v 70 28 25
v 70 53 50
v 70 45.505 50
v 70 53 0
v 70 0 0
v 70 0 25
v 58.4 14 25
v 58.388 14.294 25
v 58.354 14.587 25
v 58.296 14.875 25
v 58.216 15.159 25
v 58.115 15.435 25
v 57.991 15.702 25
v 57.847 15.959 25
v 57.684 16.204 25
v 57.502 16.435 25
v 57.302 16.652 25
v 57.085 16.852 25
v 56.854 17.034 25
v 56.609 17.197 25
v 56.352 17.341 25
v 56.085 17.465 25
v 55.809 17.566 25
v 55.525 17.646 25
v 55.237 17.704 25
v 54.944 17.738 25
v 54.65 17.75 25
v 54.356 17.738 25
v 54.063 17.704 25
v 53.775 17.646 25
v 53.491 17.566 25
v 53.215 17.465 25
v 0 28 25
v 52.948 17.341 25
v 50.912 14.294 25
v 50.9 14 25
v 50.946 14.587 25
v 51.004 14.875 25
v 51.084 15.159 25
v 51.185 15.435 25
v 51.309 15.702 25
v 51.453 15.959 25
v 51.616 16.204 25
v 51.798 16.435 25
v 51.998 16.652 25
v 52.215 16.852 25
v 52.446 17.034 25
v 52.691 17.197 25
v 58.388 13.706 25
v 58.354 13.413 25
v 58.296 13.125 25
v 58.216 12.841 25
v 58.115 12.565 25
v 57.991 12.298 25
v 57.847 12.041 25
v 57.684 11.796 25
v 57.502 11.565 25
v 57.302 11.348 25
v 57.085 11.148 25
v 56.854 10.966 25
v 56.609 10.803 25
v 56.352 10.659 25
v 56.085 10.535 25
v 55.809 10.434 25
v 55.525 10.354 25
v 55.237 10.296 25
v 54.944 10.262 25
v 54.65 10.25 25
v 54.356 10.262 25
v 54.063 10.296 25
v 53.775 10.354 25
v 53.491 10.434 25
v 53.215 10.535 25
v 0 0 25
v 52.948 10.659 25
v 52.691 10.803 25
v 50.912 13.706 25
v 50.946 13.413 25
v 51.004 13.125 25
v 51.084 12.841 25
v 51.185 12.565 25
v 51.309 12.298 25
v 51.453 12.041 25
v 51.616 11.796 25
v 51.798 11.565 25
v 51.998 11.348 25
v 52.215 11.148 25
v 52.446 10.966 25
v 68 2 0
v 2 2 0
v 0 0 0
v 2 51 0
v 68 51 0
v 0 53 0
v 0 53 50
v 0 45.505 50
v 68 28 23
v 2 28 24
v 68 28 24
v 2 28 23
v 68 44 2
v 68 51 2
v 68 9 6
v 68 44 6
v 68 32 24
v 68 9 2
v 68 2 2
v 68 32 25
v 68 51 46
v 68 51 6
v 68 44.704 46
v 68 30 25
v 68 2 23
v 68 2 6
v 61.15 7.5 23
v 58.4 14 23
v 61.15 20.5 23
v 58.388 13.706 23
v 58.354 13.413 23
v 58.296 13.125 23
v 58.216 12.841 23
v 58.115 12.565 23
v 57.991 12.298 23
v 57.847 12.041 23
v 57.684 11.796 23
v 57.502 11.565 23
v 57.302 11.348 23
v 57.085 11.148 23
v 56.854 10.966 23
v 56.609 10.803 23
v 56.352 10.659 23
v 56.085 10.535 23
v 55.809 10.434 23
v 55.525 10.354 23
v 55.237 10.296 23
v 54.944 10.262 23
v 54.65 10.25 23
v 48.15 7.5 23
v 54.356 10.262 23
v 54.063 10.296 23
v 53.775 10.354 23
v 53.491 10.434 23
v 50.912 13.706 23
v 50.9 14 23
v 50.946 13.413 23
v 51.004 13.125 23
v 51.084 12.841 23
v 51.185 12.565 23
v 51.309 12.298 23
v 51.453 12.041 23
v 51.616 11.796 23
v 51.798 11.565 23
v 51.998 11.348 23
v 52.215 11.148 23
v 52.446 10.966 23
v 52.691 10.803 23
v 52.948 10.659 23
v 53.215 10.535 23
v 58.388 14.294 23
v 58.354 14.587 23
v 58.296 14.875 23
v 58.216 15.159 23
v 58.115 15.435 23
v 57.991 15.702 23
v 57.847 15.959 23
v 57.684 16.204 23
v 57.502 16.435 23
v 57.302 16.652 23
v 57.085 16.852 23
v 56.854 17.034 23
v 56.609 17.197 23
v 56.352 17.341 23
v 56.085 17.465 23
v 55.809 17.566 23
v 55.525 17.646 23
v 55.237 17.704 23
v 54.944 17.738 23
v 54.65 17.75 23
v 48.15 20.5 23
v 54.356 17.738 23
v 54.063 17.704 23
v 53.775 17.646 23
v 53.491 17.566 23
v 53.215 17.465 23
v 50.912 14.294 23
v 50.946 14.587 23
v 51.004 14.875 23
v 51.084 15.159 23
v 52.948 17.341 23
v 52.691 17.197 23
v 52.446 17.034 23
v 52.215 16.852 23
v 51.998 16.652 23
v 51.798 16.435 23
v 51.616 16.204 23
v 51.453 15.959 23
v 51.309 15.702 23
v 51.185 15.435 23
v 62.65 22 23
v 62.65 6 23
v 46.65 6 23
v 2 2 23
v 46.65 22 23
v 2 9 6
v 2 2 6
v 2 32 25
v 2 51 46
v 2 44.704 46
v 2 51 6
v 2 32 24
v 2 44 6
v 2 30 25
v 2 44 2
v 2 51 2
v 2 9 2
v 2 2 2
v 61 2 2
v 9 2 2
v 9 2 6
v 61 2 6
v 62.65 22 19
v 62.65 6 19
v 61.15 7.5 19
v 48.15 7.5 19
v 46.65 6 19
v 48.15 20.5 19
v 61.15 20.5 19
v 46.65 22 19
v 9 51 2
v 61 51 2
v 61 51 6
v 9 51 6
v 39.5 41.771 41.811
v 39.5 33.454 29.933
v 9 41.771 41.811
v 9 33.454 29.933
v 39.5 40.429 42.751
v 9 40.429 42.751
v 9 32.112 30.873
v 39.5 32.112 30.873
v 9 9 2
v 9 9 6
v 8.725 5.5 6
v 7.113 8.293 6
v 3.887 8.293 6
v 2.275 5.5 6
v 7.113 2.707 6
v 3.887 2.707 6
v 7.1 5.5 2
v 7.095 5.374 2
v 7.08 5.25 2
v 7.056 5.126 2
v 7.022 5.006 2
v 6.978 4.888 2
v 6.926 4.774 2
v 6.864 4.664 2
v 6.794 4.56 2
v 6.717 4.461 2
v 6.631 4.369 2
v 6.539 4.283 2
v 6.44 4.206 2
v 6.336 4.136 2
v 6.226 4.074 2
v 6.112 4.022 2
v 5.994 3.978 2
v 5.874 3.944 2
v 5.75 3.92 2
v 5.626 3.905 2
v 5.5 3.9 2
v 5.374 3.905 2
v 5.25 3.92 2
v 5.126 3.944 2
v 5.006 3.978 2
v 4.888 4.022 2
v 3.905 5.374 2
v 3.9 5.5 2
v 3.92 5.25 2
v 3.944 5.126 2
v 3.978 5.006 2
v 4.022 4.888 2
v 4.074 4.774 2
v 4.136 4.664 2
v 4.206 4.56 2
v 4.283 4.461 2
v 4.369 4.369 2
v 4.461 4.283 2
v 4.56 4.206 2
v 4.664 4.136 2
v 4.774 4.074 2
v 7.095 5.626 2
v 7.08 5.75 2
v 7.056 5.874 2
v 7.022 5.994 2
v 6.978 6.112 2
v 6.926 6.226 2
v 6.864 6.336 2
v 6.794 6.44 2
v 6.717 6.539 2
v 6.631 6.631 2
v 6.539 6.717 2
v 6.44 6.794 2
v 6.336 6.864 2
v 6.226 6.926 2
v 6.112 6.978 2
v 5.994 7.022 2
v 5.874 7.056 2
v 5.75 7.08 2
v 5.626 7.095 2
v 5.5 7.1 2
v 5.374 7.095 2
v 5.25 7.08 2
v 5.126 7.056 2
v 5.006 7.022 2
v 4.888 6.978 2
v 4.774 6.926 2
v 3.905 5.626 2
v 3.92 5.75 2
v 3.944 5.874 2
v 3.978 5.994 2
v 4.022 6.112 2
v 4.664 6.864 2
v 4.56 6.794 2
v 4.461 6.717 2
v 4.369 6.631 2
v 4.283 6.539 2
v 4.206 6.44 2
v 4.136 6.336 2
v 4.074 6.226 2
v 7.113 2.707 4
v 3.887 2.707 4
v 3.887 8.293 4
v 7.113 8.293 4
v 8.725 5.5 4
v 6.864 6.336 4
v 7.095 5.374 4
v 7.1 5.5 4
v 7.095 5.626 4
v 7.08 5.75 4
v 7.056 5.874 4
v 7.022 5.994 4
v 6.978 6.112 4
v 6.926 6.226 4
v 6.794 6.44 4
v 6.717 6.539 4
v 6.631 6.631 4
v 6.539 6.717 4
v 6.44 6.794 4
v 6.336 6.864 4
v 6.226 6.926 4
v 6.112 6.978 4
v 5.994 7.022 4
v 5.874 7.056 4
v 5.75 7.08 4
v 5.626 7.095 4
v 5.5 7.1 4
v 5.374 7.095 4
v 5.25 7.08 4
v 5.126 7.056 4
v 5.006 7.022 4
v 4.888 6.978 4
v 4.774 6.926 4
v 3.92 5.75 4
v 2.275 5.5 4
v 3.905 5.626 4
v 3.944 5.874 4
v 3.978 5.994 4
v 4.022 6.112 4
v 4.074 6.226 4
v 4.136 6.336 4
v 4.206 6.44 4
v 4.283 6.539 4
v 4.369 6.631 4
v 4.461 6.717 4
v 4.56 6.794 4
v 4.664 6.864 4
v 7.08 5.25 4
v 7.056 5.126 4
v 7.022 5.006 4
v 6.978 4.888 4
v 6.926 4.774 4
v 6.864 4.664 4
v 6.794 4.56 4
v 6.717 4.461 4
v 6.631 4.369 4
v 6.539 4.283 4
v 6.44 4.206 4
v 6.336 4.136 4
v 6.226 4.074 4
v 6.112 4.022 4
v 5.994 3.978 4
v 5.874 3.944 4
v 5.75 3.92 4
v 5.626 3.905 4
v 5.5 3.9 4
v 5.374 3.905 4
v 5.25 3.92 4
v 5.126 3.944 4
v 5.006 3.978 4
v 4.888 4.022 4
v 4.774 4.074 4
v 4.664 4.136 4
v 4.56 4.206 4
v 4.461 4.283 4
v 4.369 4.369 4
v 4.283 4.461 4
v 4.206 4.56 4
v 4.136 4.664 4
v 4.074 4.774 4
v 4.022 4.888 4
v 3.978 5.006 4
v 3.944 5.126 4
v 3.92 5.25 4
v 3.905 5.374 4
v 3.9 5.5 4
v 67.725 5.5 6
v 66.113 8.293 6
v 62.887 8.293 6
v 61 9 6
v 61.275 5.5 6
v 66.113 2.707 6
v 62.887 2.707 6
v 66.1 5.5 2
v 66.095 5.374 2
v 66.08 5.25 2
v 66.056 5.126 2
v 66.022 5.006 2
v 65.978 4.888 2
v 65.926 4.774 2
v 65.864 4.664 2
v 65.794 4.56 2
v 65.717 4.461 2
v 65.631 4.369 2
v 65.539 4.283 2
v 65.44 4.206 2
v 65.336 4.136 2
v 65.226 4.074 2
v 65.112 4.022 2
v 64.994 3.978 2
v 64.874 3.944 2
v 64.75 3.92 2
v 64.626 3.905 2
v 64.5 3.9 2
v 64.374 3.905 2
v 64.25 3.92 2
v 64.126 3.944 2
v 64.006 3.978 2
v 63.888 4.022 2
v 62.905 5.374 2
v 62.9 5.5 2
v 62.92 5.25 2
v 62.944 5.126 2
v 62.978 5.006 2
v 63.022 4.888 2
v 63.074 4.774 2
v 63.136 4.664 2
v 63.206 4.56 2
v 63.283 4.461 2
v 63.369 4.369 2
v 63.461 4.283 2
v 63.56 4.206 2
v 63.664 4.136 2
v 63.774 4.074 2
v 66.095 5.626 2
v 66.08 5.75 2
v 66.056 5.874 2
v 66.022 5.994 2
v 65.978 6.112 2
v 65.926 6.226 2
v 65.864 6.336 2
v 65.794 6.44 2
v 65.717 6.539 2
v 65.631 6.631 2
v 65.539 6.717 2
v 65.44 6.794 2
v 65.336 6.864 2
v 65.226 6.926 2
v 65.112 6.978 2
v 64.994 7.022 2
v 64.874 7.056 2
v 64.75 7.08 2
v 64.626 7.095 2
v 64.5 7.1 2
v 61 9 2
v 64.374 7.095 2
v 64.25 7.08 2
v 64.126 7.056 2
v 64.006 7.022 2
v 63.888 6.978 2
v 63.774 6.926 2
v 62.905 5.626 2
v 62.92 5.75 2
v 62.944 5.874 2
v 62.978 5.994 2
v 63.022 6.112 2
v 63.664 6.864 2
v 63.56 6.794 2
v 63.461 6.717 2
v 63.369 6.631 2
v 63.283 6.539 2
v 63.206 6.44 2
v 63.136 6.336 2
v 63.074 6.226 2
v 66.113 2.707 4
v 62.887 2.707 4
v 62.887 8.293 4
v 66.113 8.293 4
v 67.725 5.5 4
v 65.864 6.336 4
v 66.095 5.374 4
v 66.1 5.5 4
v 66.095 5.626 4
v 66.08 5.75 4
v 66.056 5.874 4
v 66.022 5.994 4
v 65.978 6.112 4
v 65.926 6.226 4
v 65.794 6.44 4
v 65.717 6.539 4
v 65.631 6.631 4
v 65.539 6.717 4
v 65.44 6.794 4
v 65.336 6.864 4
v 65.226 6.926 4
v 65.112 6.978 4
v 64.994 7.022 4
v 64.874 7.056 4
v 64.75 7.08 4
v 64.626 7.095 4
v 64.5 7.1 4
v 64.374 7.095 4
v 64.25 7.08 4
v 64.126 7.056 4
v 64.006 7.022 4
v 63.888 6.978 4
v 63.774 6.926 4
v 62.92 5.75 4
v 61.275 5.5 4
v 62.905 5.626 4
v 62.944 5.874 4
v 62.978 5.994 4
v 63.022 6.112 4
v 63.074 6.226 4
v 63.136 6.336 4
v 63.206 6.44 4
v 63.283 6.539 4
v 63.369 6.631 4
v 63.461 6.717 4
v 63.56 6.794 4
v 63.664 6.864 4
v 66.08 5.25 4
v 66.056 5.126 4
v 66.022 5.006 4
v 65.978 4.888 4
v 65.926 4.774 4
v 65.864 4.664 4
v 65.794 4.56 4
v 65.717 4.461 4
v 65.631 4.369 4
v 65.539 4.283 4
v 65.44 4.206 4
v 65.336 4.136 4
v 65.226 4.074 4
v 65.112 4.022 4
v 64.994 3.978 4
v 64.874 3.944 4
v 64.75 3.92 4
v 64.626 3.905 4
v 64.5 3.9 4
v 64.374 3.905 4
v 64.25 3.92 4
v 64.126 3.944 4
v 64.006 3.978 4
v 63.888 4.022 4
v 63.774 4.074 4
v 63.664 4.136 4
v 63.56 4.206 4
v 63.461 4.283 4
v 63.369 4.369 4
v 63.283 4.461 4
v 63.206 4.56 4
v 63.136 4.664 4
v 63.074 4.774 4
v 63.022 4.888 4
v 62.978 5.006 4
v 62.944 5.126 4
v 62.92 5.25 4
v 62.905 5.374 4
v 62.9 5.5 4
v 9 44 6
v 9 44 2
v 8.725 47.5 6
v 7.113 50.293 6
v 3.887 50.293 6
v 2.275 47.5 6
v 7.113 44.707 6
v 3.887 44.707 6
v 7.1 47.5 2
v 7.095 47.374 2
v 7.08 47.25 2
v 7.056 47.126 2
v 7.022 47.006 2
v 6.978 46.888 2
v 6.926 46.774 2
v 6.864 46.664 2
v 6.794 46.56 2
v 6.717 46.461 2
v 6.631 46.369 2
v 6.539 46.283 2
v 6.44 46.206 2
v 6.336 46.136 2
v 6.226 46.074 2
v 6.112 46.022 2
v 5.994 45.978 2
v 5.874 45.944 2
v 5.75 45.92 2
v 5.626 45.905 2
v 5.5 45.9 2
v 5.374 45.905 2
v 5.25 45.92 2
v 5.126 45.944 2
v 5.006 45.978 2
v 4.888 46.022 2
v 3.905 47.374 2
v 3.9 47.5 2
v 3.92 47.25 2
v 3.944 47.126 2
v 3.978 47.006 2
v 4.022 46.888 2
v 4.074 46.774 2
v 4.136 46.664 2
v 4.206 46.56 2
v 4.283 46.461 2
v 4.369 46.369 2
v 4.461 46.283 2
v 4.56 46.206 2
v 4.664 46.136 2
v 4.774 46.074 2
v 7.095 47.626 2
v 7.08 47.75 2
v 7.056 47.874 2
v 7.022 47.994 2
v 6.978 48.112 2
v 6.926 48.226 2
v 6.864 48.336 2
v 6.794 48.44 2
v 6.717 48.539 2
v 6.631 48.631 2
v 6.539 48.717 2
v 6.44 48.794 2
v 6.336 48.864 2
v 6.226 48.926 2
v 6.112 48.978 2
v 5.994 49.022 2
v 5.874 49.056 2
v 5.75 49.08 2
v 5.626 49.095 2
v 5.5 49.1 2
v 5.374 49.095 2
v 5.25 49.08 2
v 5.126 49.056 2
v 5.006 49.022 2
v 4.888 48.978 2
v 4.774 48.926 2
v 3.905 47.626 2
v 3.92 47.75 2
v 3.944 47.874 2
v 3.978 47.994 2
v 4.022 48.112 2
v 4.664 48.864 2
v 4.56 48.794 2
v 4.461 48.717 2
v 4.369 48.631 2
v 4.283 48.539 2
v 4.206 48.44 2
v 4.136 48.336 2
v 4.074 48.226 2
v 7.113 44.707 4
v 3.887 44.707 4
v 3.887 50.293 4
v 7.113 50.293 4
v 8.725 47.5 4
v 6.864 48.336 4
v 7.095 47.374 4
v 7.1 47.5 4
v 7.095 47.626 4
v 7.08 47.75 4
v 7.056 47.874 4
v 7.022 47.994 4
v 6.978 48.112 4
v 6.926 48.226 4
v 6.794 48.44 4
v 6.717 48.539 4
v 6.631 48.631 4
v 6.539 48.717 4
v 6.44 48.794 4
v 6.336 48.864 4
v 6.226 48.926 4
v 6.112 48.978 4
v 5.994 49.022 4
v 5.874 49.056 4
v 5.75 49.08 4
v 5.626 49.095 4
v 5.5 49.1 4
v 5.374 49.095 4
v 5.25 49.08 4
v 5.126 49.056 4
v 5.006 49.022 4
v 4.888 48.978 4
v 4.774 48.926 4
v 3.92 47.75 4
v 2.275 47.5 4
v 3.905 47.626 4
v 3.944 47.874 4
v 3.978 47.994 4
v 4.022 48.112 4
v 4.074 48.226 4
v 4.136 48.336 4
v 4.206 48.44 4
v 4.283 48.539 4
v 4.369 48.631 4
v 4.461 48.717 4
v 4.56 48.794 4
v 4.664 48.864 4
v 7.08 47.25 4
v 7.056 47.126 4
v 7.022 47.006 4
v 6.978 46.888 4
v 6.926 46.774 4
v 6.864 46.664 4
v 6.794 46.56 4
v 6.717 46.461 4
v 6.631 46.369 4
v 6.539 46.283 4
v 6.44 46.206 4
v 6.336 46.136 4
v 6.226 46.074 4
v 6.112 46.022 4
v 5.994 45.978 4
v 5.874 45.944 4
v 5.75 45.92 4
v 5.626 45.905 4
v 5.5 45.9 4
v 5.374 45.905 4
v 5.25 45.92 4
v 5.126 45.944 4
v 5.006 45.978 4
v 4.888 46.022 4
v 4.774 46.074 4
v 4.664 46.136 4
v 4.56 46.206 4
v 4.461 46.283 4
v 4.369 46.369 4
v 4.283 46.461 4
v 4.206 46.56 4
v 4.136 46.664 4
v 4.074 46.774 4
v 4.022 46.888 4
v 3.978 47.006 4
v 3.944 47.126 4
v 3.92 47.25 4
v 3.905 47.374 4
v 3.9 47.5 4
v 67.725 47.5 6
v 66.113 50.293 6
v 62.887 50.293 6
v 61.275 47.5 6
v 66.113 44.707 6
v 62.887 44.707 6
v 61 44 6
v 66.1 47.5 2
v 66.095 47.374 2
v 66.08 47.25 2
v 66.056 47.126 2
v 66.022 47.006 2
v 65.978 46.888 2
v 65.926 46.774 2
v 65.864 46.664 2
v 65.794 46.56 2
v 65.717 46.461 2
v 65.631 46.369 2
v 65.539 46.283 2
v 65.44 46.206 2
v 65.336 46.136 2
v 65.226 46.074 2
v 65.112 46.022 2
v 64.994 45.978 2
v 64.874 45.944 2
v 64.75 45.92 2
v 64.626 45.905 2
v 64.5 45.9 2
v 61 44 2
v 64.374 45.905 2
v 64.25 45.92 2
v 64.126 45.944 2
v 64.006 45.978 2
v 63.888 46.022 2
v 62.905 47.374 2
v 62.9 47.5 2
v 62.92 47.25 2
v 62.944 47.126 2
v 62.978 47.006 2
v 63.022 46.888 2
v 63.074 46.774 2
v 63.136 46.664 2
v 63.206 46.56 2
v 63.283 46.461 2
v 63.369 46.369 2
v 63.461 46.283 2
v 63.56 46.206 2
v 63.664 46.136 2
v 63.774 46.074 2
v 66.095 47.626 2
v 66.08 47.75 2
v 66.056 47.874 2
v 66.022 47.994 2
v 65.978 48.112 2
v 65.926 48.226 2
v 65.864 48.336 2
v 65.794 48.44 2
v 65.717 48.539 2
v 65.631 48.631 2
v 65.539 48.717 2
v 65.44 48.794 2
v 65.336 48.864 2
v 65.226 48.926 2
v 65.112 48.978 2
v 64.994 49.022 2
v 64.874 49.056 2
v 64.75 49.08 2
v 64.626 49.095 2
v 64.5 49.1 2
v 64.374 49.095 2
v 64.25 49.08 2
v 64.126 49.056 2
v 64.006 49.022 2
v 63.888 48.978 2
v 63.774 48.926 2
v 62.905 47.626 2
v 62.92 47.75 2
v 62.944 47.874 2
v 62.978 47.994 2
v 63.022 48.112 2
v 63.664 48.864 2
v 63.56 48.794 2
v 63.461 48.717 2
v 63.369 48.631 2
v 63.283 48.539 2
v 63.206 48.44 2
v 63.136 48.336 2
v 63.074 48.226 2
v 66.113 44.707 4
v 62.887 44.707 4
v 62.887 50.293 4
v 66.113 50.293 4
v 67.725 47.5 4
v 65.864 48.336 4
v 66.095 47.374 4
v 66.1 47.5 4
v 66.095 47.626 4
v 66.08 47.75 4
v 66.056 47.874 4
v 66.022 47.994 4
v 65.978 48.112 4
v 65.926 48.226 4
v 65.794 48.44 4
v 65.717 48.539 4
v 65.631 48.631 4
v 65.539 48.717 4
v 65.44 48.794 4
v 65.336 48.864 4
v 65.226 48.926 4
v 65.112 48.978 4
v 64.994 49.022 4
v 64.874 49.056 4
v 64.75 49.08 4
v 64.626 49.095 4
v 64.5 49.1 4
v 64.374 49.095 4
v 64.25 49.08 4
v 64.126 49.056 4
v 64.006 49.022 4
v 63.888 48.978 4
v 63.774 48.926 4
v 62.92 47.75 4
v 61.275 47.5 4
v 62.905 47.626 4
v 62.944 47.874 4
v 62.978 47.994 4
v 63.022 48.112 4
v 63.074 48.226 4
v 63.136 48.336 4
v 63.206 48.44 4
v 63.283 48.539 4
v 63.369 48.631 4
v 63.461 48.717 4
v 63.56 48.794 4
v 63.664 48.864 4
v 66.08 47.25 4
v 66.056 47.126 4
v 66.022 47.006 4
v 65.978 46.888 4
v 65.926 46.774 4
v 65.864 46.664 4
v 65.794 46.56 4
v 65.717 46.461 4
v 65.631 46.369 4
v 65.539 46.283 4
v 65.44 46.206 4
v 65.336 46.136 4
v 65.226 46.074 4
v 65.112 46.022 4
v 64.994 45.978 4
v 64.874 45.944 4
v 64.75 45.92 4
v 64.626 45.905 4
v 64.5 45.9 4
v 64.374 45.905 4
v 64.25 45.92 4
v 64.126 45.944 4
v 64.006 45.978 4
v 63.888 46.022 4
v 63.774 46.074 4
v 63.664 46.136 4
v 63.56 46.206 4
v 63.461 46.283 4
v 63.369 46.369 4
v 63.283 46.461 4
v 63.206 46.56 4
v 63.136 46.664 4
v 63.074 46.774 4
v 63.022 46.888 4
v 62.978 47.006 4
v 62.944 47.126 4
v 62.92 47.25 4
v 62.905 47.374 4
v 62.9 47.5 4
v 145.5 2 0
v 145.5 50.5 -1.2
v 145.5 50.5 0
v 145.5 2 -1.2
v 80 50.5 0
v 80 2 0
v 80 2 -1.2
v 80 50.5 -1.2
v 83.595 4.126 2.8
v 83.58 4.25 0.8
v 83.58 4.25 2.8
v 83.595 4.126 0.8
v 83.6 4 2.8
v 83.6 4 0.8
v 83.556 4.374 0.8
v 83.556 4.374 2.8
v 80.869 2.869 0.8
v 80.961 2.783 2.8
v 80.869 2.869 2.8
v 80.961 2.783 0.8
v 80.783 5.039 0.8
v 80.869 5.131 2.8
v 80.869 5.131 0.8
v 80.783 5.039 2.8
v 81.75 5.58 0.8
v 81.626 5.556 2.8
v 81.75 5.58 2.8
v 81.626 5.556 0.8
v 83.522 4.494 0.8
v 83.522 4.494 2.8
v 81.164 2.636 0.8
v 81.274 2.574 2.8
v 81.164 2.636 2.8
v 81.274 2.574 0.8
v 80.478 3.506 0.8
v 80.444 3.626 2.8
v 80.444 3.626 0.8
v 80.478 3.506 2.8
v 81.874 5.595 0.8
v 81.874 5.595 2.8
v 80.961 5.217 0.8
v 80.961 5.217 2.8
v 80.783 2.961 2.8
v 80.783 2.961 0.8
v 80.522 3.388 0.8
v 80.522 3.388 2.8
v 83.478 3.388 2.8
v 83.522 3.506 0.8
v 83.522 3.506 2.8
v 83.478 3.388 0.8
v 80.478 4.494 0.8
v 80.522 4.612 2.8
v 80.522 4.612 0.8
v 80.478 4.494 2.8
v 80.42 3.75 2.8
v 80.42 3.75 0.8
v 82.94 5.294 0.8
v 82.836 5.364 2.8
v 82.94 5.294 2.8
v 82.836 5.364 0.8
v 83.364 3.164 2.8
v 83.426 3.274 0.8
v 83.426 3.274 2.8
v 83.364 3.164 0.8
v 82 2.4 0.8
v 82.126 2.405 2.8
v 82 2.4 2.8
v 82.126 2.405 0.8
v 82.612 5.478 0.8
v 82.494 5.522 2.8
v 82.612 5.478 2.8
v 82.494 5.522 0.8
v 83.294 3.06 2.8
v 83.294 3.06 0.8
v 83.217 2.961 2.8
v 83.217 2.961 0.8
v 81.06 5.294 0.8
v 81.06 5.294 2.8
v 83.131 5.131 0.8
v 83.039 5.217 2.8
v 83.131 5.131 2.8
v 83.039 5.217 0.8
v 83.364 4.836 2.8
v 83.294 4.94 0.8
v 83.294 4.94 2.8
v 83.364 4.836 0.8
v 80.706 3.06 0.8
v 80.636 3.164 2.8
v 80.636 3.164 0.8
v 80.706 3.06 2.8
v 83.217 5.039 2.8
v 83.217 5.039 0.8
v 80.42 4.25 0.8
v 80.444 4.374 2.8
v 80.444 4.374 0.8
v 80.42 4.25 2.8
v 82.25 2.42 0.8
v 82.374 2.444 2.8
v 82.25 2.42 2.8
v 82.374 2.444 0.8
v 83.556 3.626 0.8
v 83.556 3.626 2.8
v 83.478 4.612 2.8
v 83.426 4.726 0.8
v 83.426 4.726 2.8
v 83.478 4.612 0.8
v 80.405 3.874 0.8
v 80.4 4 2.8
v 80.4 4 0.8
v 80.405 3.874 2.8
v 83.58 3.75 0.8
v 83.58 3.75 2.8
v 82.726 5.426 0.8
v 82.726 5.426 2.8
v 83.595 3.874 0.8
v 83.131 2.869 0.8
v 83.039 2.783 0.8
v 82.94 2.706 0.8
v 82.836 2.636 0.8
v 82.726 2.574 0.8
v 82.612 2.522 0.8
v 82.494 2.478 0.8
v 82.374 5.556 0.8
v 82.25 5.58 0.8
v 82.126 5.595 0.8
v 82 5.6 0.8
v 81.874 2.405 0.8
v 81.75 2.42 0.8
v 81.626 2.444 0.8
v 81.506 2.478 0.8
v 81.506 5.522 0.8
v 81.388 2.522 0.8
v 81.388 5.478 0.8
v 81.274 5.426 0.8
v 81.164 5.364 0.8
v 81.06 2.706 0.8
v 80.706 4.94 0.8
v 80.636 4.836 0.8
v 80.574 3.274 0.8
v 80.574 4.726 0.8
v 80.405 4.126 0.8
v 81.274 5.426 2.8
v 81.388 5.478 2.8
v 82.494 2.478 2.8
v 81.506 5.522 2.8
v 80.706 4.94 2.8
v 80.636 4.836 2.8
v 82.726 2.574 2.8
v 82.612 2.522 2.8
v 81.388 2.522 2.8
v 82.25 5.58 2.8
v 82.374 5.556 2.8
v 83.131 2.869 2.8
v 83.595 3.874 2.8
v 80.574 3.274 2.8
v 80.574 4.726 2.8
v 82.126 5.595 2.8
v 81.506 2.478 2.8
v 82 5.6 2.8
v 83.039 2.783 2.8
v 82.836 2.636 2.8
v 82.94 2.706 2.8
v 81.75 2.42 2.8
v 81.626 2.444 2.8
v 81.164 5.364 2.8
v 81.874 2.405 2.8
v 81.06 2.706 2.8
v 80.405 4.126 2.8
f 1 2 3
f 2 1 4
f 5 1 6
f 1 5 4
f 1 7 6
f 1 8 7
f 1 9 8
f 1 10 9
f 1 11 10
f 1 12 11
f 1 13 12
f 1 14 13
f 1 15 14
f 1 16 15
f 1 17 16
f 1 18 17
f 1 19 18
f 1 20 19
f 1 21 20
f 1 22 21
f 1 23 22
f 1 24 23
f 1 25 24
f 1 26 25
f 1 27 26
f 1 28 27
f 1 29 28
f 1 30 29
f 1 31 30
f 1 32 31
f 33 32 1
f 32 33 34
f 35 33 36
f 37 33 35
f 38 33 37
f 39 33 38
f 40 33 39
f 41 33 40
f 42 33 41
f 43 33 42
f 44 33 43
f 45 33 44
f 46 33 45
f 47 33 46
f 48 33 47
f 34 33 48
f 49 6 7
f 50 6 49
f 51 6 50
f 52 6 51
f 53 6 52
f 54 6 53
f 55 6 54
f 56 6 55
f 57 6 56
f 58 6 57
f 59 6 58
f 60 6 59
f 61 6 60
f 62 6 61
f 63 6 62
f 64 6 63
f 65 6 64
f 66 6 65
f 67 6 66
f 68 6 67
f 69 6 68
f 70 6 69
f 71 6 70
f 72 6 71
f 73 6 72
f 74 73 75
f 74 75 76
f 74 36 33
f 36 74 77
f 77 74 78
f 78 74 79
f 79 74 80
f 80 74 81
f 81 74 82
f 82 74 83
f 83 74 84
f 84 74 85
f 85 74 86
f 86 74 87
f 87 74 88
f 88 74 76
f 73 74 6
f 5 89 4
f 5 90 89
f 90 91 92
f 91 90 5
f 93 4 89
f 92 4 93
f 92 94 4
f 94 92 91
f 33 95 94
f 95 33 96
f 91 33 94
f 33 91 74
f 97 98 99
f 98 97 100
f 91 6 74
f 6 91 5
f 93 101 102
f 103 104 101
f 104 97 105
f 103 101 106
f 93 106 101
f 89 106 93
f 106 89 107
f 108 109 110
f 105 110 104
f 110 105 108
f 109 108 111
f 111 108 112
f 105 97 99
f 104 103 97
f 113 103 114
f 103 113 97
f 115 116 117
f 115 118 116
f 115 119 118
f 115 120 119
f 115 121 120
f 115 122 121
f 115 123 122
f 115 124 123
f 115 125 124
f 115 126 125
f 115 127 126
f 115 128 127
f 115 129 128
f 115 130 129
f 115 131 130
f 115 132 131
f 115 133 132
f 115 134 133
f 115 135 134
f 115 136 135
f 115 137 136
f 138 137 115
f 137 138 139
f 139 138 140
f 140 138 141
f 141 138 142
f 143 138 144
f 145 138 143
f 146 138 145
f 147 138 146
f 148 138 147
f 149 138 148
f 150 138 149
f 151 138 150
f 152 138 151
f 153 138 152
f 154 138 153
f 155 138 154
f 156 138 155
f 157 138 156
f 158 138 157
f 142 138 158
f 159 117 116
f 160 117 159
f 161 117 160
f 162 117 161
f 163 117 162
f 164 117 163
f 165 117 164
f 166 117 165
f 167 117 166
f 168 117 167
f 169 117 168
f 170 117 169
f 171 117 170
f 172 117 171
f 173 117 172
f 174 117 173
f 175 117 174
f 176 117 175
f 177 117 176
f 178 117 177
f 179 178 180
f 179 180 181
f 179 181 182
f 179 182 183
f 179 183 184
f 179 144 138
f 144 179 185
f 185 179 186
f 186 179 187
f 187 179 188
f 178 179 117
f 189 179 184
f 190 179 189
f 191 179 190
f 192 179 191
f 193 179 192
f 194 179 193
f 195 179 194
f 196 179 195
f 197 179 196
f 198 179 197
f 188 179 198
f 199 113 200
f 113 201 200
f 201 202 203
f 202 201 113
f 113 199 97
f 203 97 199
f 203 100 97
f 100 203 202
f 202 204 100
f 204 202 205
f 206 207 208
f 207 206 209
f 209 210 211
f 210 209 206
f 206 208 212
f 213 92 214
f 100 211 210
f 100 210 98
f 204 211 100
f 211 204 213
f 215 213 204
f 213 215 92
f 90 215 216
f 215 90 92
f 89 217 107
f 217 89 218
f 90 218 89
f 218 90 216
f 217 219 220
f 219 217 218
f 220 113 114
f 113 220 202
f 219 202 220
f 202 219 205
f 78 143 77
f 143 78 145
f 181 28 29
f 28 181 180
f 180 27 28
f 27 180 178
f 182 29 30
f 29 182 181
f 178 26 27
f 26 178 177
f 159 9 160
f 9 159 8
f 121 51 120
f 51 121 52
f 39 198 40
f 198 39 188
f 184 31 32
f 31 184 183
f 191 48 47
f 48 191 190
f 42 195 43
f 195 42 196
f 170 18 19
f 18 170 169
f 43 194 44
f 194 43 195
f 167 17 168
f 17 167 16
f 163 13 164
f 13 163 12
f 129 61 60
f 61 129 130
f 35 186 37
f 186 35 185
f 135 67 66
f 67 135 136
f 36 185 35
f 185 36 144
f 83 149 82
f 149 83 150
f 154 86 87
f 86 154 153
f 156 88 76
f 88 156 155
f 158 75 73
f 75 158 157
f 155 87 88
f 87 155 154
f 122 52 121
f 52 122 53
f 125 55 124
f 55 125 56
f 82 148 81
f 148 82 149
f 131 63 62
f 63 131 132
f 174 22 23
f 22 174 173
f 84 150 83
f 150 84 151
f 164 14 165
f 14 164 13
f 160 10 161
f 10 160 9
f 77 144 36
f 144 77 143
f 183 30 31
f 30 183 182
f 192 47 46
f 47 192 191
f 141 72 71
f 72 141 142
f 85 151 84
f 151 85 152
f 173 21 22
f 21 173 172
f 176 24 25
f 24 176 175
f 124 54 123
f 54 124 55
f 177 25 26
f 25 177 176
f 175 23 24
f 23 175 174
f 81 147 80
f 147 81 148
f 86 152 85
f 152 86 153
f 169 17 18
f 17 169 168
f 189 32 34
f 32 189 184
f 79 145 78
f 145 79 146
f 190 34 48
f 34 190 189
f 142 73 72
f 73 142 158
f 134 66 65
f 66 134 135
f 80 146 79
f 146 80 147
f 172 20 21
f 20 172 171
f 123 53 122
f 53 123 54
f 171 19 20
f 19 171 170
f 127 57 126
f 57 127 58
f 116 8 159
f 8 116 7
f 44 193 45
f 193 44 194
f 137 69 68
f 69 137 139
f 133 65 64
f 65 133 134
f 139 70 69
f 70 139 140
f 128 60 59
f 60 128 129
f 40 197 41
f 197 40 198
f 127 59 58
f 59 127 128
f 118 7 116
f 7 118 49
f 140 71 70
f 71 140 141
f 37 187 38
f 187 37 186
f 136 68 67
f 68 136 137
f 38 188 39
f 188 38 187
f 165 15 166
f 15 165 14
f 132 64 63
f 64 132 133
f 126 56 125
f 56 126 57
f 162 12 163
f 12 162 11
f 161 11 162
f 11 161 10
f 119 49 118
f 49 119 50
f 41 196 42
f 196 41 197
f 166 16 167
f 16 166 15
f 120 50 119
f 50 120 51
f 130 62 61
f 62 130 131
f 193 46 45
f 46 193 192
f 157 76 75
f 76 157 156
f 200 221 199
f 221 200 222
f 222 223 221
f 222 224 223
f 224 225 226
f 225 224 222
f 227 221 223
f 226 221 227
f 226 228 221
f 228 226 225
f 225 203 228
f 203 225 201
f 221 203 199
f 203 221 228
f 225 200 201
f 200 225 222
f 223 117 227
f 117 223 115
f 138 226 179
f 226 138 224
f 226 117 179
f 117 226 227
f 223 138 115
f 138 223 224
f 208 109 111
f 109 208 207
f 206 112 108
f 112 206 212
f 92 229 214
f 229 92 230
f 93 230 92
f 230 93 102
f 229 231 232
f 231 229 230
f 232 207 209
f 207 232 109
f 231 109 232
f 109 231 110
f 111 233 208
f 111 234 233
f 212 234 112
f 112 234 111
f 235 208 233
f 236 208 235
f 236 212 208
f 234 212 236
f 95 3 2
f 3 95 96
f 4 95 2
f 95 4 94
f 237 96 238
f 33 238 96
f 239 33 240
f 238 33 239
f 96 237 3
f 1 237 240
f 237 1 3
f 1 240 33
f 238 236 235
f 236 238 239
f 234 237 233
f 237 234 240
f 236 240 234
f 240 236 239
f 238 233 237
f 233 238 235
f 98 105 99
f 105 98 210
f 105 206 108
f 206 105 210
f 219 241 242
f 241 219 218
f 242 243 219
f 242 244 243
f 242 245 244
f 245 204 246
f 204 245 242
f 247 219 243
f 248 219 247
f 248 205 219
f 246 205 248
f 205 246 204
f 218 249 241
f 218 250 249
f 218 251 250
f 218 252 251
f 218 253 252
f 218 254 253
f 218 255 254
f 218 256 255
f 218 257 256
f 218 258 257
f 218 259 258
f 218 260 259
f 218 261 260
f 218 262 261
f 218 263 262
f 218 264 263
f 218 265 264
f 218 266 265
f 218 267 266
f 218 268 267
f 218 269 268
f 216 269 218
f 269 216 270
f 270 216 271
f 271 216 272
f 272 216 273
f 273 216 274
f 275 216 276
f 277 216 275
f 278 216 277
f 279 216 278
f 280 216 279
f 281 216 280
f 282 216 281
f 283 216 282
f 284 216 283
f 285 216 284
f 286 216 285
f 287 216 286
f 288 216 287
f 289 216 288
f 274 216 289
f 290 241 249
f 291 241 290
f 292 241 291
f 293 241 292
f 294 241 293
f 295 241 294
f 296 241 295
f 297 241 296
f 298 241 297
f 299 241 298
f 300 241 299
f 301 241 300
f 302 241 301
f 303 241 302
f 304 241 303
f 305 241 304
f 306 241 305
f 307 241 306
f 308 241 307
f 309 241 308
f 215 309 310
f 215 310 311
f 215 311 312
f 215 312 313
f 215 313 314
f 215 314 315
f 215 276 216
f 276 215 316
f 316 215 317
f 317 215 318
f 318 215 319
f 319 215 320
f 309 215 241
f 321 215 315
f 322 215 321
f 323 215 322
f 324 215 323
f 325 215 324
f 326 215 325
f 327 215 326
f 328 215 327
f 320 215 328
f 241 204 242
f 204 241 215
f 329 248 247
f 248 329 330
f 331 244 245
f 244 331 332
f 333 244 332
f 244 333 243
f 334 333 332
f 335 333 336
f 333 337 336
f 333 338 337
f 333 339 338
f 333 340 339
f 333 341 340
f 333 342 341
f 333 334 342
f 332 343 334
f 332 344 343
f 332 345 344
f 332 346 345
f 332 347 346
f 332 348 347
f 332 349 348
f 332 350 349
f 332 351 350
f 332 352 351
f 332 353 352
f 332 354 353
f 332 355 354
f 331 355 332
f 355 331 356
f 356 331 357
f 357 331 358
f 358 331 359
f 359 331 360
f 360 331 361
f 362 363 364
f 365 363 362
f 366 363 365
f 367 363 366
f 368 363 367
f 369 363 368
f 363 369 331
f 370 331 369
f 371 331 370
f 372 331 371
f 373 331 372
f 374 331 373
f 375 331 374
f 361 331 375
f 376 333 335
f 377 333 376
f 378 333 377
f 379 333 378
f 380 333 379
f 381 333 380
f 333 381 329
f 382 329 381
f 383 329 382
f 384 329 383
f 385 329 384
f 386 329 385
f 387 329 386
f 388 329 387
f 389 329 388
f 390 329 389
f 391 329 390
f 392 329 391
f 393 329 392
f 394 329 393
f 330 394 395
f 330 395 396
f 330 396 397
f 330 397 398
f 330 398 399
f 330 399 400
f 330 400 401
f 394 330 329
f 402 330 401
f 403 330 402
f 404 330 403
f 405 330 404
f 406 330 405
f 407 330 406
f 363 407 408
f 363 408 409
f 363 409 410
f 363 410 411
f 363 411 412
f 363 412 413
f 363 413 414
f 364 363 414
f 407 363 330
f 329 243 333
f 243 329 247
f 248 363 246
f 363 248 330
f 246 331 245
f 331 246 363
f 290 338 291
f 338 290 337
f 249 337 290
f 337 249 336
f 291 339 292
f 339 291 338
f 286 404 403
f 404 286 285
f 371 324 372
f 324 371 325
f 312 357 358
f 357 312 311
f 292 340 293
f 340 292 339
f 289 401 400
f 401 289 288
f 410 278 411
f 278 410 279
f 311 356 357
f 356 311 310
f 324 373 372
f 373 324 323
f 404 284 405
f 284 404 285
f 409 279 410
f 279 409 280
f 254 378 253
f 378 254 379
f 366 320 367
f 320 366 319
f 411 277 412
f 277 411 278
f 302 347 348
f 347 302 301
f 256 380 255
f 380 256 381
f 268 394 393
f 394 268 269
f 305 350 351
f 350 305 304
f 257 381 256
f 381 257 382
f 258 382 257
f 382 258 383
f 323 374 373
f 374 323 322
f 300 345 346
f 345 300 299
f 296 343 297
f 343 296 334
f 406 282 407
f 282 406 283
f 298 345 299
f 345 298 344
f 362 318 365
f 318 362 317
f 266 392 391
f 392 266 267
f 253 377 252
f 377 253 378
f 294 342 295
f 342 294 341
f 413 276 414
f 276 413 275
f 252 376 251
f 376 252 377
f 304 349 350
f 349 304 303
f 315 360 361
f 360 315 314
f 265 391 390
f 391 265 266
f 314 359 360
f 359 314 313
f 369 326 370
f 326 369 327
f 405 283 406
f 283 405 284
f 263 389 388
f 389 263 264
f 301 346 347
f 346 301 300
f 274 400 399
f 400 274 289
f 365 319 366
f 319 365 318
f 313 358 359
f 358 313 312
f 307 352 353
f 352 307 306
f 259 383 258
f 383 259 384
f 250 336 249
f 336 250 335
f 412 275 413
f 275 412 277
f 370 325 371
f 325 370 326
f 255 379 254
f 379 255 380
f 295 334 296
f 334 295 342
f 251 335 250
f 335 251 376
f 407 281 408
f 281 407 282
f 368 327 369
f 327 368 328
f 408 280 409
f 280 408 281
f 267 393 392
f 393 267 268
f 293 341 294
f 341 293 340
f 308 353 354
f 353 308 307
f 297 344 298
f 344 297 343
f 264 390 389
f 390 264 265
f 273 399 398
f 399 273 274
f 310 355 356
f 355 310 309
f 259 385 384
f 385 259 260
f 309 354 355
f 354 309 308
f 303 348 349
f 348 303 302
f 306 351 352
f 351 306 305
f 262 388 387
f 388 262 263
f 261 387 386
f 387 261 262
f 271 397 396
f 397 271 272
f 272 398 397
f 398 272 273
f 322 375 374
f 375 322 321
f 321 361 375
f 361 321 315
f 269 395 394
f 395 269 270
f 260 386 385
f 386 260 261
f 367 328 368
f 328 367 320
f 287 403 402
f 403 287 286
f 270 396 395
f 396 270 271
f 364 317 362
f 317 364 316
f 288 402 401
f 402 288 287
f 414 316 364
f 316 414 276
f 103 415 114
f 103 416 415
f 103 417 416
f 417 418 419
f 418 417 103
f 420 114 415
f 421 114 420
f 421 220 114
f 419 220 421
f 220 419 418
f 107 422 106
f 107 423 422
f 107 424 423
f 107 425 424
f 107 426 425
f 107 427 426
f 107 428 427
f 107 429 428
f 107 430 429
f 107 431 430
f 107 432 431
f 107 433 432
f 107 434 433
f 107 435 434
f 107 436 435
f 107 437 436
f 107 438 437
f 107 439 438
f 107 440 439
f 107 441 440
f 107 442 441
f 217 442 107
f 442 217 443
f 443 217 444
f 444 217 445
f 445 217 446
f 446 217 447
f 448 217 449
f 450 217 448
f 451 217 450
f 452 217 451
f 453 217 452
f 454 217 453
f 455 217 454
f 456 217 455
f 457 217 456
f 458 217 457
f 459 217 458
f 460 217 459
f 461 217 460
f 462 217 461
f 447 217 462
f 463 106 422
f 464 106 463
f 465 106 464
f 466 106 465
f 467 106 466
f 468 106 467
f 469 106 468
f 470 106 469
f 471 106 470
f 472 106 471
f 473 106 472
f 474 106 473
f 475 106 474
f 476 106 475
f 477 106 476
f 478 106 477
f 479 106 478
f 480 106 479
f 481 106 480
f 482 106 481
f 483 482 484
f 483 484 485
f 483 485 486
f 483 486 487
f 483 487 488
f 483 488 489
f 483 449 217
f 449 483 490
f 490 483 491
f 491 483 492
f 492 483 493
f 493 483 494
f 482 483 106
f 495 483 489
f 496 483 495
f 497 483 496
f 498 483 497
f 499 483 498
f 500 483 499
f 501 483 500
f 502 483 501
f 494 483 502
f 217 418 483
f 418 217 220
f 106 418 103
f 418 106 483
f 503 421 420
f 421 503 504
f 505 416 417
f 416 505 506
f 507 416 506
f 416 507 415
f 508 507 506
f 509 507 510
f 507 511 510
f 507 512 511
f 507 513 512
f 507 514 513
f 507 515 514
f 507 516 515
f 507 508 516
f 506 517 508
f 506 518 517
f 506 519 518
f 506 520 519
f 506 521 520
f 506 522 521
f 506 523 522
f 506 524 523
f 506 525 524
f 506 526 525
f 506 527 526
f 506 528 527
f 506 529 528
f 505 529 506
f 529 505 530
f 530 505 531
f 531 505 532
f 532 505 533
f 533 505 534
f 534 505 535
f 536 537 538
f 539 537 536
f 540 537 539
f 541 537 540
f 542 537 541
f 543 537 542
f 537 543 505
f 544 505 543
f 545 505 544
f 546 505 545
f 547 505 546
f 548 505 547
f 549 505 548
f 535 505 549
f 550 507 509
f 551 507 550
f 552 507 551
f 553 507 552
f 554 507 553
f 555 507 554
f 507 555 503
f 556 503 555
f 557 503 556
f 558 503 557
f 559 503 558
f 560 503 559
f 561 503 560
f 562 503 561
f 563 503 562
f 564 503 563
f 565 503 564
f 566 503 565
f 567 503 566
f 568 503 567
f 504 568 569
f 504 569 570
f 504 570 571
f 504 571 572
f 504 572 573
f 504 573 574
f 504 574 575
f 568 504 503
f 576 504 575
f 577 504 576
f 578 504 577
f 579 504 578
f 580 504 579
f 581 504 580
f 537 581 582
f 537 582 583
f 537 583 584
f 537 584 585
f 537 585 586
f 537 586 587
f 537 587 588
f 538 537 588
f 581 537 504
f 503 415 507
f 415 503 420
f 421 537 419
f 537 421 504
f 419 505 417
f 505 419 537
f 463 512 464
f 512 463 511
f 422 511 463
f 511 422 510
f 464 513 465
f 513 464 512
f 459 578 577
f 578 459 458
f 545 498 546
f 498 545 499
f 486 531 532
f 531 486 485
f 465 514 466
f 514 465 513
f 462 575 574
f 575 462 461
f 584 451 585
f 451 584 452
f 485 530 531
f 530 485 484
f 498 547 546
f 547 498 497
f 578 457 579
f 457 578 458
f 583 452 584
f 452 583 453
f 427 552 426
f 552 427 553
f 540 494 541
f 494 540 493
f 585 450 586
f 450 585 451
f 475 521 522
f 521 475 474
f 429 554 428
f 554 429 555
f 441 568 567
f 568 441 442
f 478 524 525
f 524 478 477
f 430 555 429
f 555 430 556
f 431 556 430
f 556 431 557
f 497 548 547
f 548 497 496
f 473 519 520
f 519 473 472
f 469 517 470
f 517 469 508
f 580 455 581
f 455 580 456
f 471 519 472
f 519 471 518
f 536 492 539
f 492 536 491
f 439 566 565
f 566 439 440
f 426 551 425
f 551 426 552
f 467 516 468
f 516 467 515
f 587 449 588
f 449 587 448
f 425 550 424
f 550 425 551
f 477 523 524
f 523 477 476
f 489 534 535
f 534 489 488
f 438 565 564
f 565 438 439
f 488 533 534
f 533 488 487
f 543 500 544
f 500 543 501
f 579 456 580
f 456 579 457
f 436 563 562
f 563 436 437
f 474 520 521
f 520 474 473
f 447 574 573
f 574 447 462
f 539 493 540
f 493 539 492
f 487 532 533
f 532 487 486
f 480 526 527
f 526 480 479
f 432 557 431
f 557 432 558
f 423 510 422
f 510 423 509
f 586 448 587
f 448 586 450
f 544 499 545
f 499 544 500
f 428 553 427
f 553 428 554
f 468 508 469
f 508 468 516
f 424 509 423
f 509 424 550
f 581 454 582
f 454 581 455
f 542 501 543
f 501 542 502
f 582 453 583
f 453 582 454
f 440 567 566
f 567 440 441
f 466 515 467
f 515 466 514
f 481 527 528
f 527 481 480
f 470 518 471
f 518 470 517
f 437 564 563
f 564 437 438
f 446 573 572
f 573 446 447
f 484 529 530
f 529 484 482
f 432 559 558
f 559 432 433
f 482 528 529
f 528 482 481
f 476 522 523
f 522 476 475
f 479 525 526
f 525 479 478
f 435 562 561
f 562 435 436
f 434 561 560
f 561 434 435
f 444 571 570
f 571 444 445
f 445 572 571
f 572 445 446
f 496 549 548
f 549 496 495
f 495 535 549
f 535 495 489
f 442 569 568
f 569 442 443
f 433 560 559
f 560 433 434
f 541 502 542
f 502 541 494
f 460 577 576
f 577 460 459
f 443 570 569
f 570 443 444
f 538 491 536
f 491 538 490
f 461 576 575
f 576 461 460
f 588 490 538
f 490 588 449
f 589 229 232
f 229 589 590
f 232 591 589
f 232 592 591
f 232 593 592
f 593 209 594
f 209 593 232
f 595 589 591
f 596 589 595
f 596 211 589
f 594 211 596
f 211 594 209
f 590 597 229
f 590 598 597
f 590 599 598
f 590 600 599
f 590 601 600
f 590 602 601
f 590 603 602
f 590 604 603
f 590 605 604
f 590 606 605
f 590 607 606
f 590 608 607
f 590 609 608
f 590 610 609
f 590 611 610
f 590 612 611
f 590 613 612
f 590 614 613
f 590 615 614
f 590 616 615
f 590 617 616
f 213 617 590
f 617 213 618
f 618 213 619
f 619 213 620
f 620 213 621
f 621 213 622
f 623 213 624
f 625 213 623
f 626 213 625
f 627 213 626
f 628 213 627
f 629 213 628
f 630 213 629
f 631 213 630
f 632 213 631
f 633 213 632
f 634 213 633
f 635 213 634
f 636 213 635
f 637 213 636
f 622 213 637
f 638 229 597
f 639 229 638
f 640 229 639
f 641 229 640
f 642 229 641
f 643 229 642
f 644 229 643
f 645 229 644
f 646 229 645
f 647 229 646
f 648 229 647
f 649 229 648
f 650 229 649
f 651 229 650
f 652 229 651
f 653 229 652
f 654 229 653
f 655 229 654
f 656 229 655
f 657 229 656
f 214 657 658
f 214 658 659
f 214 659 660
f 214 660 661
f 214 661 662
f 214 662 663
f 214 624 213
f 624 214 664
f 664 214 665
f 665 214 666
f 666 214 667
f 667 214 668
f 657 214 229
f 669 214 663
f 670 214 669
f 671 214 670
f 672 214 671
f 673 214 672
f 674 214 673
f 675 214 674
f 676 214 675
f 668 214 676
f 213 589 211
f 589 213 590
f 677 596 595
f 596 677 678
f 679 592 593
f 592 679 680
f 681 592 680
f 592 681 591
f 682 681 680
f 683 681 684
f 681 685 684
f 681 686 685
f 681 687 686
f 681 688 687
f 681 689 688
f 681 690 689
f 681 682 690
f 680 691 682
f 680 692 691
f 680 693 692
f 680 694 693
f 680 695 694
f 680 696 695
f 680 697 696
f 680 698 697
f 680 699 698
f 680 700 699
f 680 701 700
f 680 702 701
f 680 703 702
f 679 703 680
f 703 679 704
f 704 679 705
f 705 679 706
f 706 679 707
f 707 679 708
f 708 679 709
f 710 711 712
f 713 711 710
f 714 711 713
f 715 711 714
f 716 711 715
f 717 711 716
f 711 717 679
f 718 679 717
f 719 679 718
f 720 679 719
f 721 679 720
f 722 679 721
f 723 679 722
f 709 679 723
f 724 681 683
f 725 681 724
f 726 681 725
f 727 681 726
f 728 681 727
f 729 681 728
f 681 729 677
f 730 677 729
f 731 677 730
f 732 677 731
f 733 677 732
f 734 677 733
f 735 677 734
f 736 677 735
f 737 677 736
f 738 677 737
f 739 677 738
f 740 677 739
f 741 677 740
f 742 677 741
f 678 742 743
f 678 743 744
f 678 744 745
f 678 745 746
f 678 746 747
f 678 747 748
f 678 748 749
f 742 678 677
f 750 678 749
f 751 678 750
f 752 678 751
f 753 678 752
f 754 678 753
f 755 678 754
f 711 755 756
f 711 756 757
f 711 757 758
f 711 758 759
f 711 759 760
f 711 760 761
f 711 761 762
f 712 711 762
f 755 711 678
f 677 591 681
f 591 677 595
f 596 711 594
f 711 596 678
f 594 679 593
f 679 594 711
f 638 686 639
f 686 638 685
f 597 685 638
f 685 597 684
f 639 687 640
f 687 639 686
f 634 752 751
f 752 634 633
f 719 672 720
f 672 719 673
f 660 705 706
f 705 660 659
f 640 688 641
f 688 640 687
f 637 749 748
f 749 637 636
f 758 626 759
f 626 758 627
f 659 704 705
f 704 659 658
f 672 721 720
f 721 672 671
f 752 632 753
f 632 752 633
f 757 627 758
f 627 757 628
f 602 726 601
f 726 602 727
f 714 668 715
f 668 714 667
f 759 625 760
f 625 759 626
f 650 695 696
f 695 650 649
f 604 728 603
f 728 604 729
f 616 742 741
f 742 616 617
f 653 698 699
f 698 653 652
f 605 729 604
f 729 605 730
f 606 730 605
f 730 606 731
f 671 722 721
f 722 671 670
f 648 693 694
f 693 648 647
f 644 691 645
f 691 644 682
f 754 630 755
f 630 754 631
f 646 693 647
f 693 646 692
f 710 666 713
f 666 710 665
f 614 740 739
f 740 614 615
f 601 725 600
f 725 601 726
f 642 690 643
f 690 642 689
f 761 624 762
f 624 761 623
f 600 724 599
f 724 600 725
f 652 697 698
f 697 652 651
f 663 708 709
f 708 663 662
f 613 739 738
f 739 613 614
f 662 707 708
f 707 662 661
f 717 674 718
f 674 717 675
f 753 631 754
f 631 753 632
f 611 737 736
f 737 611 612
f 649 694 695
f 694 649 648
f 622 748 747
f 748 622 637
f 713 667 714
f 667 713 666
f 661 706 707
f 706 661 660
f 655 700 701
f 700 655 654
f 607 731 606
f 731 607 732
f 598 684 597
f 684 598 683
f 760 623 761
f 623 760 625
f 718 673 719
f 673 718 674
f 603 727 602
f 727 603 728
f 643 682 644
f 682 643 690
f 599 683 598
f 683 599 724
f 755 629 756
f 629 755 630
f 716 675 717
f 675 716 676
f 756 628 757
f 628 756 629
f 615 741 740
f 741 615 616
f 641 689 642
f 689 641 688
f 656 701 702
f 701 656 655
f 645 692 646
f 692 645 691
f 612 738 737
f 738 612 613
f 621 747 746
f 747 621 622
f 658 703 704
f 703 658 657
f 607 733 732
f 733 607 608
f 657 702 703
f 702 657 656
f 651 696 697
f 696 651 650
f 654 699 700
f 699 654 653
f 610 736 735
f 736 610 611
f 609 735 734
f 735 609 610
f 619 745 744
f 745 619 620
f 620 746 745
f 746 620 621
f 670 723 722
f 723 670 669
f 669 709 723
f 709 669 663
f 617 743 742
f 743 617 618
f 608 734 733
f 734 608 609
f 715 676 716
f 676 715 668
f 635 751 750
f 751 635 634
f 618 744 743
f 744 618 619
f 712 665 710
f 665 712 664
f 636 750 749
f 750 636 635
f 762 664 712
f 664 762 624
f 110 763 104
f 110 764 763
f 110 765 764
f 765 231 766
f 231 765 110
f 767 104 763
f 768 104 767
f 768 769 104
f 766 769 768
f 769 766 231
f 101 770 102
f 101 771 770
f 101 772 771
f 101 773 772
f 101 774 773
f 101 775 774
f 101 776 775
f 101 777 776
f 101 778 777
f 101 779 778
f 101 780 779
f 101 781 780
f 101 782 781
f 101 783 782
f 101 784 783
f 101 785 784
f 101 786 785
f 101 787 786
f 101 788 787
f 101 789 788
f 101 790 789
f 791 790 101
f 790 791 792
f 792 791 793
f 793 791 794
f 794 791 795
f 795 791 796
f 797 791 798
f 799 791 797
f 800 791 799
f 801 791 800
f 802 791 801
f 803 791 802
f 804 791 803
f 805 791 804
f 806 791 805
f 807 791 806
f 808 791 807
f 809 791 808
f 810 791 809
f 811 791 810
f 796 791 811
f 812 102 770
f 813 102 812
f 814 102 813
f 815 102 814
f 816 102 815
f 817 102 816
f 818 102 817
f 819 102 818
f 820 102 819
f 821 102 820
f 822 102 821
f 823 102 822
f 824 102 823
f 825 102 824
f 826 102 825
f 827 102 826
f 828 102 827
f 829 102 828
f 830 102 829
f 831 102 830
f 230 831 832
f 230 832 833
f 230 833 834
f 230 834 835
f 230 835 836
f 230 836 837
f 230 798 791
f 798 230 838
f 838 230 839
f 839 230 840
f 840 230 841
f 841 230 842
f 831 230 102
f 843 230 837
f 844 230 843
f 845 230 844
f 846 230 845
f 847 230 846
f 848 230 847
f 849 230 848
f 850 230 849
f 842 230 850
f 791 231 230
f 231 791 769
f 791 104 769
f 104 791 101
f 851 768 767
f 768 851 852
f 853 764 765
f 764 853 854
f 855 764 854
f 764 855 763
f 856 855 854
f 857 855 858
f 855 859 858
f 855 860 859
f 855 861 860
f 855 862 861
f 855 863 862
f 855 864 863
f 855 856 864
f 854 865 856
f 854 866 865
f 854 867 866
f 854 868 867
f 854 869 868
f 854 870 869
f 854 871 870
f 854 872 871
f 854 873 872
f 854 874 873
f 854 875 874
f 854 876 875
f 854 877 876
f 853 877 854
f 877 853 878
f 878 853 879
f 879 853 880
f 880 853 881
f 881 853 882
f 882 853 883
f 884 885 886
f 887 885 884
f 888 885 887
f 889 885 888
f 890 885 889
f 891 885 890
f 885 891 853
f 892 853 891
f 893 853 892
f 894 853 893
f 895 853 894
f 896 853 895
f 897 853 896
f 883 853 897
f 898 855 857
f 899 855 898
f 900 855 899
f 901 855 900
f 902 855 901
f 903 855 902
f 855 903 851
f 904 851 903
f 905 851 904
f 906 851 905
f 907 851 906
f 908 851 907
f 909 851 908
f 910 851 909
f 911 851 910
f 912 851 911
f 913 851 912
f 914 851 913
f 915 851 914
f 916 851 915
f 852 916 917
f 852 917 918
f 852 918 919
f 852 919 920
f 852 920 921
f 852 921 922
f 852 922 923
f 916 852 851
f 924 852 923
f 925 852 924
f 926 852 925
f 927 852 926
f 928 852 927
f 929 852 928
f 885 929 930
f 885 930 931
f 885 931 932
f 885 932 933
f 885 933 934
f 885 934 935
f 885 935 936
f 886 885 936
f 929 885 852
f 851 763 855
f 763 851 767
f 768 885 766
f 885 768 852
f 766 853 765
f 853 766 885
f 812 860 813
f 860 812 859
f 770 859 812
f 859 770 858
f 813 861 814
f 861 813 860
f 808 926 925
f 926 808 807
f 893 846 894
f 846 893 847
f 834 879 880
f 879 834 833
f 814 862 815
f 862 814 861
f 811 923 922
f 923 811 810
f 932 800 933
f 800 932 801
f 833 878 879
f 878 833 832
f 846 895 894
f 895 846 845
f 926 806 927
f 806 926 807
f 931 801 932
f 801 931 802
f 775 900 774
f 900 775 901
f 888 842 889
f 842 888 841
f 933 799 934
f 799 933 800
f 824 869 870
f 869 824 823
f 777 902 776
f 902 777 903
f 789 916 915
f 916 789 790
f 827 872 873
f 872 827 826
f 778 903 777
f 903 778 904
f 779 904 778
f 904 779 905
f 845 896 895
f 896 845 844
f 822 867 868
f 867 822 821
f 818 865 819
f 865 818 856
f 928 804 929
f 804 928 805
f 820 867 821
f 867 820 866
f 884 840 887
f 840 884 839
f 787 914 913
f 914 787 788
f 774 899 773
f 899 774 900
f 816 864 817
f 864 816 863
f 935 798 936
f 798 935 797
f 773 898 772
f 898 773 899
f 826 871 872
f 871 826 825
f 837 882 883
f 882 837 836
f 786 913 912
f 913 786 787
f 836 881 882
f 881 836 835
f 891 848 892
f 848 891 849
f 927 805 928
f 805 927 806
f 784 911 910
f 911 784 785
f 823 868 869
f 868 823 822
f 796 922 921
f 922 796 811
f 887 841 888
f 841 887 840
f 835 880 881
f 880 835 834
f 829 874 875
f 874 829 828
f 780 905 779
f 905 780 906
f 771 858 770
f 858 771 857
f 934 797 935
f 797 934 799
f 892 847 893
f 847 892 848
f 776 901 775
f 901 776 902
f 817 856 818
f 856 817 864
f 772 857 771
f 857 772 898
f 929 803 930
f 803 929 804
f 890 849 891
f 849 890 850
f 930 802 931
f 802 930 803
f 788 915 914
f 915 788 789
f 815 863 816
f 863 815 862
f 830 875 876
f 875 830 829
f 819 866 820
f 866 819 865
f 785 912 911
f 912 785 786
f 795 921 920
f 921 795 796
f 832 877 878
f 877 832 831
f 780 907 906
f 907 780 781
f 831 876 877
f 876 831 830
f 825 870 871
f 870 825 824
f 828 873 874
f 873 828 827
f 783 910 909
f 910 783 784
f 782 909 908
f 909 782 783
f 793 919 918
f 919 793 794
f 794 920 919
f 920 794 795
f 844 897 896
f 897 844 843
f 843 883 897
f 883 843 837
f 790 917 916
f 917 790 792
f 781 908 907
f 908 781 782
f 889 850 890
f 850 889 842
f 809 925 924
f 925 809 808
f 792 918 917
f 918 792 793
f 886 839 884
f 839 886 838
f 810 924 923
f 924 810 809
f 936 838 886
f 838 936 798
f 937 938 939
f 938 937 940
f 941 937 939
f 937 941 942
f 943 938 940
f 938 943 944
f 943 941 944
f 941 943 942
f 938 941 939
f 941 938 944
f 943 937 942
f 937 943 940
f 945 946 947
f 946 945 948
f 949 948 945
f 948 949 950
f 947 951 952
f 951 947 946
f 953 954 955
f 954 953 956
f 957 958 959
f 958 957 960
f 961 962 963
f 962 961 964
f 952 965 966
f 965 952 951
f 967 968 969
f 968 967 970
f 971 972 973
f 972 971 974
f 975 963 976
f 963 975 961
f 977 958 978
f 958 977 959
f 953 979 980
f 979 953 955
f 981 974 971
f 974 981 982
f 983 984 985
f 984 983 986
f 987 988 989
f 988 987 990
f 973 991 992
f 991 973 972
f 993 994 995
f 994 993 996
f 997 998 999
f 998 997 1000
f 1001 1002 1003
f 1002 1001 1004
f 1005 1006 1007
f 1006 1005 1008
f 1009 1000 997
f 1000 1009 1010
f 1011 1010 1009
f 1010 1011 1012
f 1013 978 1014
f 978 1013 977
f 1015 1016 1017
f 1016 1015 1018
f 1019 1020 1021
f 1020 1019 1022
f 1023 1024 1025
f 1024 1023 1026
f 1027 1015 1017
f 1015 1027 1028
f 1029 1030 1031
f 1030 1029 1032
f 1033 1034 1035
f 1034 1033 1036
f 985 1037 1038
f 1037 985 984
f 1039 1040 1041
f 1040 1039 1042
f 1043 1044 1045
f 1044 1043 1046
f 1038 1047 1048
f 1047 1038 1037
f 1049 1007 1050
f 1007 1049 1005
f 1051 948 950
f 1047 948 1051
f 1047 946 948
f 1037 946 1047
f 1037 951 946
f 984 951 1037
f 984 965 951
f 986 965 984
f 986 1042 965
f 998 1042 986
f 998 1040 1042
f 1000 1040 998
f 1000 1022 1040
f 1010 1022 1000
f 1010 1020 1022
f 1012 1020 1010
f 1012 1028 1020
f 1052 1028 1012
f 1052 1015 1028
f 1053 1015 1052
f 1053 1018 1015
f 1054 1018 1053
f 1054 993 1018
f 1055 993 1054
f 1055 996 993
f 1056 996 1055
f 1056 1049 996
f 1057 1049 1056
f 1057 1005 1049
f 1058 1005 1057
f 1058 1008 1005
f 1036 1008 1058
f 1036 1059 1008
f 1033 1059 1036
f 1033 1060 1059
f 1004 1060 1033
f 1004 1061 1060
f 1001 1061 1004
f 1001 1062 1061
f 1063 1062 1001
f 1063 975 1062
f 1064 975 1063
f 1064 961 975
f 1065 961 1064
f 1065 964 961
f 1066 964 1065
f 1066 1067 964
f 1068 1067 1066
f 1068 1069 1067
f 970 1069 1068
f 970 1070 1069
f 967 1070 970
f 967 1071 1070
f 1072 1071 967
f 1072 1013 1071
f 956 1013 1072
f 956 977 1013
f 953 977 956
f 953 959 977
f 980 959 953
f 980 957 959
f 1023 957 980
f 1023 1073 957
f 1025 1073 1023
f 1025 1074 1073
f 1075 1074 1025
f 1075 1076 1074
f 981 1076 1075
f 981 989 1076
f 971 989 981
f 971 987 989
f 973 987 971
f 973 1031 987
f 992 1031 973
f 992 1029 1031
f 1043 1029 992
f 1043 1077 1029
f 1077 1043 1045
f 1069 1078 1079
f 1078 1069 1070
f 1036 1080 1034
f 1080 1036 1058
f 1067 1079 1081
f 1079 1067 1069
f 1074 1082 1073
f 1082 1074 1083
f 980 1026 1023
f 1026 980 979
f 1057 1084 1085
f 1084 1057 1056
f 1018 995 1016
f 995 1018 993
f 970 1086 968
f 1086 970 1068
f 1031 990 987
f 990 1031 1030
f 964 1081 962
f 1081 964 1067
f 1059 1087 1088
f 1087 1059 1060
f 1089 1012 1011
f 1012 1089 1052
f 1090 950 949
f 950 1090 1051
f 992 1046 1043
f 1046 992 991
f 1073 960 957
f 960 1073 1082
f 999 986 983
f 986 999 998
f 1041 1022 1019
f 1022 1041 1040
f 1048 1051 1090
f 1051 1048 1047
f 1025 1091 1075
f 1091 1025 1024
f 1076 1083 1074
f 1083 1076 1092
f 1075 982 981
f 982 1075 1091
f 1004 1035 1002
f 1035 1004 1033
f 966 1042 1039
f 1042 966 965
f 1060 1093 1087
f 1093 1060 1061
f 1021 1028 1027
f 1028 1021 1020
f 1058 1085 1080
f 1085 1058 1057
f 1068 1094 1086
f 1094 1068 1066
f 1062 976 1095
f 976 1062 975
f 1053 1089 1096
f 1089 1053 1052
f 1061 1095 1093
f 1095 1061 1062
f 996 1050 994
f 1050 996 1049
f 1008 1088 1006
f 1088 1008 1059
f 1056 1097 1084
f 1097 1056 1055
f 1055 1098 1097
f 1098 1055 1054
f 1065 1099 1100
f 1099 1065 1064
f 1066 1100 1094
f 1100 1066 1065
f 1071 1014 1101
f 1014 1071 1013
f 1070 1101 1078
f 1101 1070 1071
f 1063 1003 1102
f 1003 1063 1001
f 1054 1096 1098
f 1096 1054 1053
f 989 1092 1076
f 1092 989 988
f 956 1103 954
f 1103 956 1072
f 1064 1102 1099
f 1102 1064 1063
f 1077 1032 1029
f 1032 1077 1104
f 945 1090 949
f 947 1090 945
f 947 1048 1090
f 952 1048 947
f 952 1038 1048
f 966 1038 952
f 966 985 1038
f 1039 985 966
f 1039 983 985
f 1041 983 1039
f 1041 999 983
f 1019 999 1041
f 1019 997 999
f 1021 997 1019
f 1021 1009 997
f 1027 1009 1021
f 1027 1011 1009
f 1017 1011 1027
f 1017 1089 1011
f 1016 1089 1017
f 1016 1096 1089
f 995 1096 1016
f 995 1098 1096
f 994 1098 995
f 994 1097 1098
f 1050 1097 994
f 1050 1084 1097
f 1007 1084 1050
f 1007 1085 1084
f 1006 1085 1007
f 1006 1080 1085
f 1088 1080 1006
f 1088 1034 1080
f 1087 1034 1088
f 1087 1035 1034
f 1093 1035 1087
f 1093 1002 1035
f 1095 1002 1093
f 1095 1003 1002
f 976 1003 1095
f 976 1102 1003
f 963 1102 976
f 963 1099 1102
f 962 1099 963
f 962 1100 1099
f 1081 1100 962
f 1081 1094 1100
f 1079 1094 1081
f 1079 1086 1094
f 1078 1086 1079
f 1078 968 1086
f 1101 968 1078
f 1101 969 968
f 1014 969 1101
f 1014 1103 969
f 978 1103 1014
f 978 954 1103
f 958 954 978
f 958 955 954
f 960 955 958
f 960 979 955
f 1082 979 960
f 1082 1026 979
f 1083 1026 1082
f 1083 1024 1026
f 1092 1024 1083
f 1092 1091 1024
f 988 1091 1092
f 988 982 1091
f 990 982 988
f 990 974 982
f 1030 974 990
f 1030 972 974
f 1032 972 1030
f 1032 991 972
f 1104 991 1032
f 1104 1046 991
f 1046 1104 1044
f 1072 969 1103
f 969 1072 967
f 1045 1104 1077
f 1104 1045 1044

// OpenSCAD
module back_inlay() {
    difference() {
            cube([70-4, 25-4, 21]);
            rotate([55, 0, 0]) {
                translate([-1, 0, 0]) {
                    cube([72, 50, 60]);
                }
            }
        }
}


module back_top() {
    cube([70, 25, 25]);
    translate([0, 0, 25]) {
        difference() {
            cube([70, 25, 25]);
            rotate([55, 0, 0]) {
                translate([-1, 0, 0]) {
                    cube([82, 50, 25]);
                }
            }
            // display
            translate([9, 25/2, 0]) {
                rotate([55, 0, 0]) {
                    cube([30.5, 14.5, 20]);
                }
            }
            translate([2, 2, 0]) {
                back_inlay();
            }
        }
    }
}

module mutter_halter() {
    difference() {
        cube([7, 7, 4]);
        translate([7/2, 7/2, 2]) {
            cylinder(r = 5.5 / 2 / cos(180 / 6) + 0.05, h=3.1, $fn=6);
        }
        translate([7/2, 7/2, -0.01]) {
            cylinder(d=3.2, h=3, $fn=80);
        }
    }
}

union() {
    difference() {
        cube([70, 28, 25]);
        translate([2, 2, -1]) {
            cube([70-4, 28, 25-1]);
        }
        translate([54.65, 28/2, 25]) {
            rotate([0, 0, 90]) {
                cylinder(d=7.5, h=20, center=true, $fn=80);
            }
        }
    }
    translate([54.65, 28/2, 25-2-(4/2)]) {
        difference() {
            cube([16, 16, 4], center=true);
            cylinder(d=7.5, h=60, center=true, $fn=80);
            translate([0, 0, 0]) {
                cube([13, 13, 5], center=true);
            }
        }
    }
    translate([0, 28, 0]) {
        difference() {
            back_top();
            translate([2, -2, -1]) {
                cube([70-4, 25, 25]);
            }
            translate([2, 4, 23]) {
                cube([70-4, 19, 4]);
            }

        }

    }
    translate([2, 2, 2]) {
        mutter_halter();
    }
    translate([70-2-7, 2, 2]) {
        mutter_halter();
    }
    translate([2, 28+25-2-7, 2]) {
        mutter_halter();
    }
    translate([70-2-7, 28+25-2-7, 2]) {
        mutter_halter();
    }
    
}


// Bodenplatte
translate([80, 2, -1.2]) {
    cube([70-4 - 0.5, 28+25-4 - 0.5, 1.2]);
    translate([2, 2, 2]) {
        cylinder(d=3.2, h=2, $fn=80);
    }
}
